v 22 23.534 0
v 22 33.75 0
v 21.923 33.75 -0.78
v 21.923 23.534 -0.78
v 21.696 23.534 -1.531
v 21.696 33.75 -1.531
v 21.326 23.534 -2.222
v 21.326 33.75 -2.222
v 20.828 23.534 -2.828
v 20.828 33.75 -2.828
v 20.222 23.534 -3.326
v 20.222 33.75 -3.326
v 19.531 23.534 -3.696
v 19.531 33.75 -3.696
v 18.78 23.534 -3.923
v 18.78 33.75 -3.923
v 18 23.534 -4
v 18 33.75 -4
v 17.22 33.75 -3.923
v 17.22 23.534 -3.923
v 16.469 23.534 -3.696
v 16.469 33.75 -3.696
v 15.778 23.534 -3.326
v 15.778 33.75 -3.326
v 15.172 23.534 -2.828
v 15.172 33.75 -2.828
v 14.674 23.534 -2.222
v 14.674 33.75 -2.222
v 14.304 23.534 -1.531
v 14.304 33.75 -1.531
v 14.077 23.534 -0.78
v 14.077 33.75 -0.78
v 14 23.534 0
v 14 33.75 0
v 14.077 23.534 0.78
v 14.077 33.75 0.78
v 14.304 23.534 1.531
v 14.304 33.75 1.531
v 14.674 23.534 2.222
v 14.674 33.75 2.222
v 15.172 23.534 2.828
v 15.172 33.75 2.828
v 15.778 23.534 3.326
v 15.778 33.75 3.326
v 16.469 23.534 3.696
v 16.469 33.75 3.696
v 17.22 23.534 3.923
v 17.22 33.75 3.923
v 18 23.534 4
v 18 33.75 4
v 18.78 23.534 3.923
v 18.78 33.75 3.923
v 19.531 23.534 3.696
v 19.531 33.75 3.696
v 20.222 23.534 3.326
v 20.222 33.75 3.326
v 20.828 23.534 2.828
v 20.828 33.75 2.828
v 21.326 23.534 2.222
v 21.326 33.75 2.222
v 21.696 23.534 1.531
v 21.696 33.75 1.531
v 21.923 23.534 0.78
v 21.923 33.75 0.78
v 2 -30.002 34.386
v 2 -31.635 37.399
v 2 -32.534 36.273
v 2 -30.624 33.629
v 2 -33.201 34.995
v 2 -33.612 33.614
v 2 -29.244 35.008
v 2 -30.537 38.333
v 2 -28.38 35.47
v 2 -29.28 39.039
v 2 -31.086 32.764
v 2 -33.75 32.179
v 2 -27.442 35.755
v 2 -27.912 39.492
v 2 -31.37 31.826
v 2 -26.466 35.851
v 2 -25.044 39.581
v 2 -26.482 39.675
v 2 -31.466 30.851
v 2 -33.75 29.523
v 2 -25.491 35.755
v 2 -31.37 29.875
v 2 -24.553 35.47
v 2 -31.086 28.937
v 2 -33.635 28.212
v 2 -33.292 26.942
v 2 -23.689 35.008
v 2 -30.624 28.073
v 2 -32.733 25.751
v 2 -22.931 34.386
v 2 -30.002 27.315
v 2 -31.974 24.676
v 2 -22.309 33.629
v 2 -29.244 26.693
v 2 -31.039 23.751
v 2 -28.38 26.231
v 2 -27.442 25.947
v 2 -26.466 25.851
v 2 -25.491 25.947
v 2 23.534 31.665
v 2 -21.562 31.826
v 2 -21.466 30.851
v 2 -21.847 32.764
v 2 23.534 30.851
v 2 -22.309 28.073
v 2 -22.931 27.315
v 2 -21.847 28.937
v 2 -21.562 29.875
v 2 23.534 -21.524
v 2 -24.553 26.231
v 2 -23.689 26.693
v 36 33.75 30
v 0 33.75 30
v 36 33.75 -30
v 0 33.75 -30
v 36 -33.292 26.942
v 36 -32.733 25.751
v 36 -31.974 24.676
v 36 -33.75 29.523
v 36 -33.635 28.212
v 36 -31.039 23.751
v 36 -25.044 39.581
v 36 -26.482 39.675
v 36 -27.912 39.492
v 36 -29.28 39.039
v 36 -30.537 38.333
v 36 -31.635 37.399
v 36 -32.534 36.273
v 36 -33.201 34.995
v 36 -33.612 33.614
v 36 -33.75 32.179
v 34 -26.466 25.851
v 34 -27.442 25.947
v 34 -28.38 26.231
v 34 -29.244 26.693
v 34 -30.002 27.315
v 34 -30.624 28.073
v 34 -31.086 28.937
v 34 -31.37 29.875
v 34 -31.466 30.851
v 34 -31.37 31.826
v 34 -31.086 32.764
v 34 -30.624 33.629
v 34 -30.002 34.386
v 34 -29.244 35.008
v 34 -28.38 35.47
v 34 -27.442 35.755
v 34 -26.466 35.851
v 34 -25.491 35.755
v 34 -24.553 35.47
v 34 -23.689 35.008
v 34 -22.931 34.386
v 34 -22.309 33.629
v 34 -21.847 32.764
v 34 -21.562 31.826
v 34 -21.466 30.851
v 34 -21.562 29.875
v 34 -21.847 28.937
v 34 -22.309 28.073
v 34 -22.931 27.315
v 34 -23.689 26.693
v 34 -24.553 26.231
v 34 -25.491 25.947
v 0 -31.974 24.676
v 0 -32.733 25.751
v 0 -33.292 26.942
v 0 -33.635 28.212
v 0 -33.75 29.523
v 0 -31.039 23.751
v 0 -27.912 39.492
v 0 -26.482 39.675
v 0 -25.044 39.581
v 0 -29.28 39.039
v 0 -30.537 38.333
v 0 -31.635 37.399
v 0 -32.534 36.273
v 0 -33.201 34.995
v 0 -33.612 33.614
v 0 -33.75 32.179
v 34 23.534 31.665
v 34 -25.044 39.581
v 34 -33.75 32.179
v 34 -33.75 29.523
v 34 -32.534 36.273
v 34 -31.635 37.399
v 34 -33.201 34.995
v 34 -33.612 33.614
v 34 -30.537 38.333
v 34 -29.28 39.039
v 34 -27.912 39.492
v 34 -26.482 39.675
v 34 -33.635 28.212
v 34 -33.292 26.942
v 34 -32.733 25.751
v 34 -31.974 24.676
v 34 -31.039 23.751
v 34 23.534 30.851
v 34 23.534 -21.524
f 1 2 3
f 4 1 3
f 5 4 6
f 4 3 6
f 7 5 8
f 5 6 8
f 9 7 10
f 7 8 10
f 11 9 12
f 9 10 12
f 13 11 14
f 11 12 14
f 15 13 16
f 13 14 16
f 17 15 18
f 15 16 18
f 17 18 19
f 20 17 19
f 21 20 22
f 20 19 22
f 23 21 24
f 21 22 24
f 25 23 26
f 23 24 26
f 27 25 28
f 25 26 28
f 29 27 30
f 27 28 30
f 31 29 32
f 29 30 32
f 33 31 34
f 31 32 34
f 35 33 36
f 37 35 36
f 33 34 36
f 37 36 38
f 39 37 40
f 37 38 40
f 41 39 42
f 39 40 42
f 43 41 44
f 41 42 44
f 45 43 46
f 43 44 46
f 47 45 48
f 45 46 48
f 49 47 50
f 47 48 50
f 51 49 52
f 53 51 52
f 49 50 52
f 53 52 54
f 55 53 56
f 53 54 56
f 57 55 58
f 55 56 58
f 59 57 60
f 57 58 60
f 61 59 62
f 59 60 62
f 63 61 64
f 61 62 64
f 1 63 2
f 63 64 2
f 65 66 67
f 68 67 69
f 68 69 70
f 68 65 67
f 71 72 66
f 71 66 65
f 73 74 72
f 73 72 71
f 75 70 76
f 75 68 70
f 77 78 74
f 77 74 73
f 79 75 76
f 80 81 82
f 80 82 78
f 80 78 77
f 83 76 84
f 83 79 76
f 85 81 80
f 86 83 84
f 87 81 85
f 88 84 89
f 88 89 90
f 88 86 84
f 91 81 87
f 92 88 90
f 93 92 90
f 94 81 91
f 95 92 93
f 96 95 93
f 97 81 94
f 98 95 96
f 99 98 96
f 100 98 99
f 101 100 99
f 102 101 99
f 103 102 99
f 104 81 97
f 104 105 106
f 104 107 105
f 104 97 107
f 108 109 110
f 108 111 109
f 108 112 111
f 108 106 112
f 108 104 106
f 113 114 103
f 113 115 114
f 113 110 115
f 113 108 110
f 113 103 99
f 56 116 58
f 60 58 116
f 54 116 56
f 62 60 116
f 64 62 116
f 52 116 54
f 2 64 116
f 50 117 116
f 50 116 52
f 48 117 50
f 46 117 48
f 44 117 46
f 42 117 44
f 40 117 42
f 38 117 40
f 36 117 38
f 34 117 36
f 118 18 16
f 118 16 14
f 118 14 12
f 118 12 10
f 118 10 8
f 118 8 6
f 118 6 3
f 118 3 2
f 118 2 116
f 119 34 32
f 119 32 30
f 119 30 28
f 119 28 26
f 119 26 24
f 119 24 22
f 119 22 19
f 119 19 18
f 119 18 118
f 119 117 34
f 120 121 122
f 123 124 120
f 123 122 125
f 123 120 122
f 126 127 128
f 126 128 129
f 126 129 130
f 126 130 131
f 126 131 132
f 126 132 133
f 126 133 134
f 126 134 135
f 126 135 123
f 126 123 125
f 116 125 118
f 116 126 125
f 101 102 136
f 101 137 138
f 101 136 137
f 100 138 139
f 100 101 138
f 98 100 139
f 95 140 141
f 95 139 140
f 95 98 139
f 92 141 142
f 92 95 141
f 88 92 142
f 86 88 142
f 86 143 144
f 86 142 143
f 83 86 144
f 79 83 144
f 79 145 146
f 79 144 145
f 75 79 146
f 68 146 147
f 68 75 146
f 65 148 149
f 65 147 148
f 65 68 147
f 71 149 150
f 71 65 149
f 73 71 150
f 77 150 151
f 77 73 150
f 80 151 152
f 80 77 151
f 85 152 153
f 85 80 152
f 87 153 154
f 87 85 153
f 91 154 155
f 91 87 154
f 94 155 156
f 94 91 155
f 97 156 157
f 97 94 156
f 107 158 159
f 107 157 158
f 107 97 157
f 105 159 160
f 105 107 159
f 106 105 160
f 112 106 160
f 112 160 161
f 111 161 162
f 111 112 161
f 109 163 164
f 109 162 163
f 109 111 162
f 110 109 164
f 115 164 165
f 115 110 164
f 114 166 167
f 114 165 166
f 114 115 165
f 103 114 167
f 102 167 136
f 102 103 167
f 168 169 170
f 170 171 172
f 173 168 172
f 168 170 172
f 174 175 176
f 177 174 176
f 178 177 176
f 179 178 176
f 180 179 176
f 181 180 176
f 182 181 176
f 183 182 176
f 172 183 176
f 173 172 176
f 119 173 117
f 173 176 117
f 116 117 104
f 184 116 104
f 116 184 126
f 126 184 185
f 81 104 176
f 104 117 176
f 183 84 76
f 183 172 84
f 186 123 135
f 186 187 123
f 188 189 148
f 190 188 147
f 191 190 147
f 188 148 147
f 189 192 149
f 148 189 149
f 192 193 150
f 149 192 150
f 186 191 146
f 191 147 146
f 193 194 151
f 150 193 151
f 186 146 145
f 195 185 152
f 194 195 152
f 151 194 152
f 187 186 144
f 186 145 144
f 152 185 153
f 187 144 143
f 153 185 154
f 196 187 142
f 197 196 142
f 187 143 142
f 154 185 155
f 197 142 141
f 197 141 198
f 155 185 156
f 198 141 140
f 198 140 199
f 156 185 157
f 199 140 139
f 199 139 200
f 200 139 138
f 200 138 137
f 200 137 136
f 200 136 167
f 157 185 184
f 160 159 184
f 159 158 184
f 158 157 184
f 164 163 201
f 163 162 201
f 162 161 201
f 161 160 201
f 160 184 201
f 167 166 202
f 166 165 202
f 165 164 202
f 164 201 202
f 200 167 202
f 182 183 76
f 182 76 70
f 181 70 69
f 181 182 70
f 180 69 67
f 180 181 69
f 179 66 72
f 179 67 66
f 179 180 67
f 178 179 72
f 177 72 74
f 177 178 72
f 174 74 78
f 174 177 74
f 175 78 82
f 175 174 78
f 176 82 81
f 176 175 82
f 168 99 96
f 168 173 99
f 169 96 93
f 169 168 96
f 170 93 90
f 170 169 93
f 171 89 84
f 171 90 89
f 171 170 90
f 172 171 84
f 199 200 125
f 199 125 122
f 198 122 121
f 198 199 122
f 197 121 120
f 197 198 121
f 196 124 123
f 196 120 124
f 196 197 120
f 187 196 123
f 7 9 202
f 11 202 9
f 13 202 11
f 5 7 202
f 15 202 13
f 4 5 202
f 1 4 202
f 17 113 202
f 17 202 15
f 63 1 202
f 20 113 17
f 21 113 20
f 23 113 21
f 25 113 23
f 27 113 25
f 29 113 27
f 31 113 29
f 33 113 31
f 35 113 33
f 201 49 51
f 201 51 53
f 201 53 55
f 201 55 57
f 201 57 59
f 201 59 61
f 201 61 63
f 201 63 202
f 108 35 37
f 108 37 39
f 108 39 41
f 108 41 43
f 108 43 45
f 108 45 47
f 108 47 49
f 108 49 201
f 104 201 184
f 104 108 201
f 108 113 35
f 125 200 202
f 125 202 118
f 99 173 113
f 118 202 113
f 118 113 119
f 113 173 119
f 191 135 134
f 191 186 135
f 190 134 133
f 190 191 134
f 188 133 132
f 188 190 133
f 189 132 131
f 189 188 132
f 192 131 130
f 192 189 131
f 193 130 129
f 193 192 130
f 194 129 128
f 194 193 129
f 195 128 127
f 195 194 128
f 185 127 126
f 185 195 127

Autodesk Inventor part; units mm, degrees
ref_plane "YZ Plane" through (0, 0, 0) normal (1, 0, 0) x (0, 1, 0)
ref_plane "XZ Plane" through (0, 0, 0) normal (0, 1, 0) x (-1, 0, 0)
ref_plane "XY Plane" through (0, 0, 0) normal (0, 0, 1) x (1, 0, 0)
sketch "스케치1" plane through (0, 0, 0) normal (1, 0, 0) x (0, 1, 0)
  line L0 (-33.75, 41) -> (33.75, 41)
  line L1 (33.75, 41) -> (33.75, -41)
  line L2 (33.75, -41) -> (-33.75, -41)
  line L3 (-33.75, 29.5228) -> (-33.75, 32.1788)
  line L4 (-33.75, 41) -> (33.75, -41) construction
  line L5 (33.75, 41) -> (-33.75, -41) construction
  line L6 (33.75, 41) -> (33.75, 35)
  line L7 (33.75, 0) -> (33.75, 30)
  line L8 (33.75, 30) -> (-25.0437, 39.5812)
  line L9 (33.75, 0) -> (33.75, -30)
  line L10 (-31.0388, 23.7507) -> (33.75, -30)
  arc A0 (-33.75, 29.5228) -> (-31.0388, 23.7507) centre (-26.25, 29.5228) ccw
  arc A1 (-25.0437, 39.5812) -> (-33.75, 32.1788) centre (-26.25, 32.1788) ccw
  point P0 (0, 0)
  point P1 (-33.75, 26)
  dimension "d3" = 67.5
  dimension "d4" = 82
  dimension "d6" = 30
  dimension "d7" = 30
  dimension "d9" = 15
  dimension "d10" = 7.5
extrude "돌출1" add sketch "스케치1" along normal blind 36
ref_plane "작업 평면1" through (18, 0, 0) normal (1, 0, 0) x (0, 0, -1)
sketch "스케치2" plane through (18, 0, 0) normal (1, 0, 0) x (0, 0, -1)
  line L0 (-30, 33.75) -> (-39.5812, -25.0437) projected
  arc A0 (-39.5812, -25.0437) -> (-32.1788, -33.75) centre (-32.1788, -26.25) ccw projected
  line L1 (-32.1788, -33.75) -> (-29.5228, -33.75) projected
  arc A1 (-29.5228, -33.75) -> (-23.7507, -31.0388) centre (-29.5228, -26.25) ccw projected
  line L2 (-23.7507, -31.0388) -> (30, 33.75) projected
  line L3 (30, 33.75) -> (-30, 33.75) projected
  line L4 (30, 33.75) -> (-30, 33.75) projected
  line L5 (-30, 33.75) -> (-39.5812, -25.0437) projected
  circle A2 centre (-30.8508, -26.4664) radius 5
  line L6 (-30.8508, -26.4664) -> (-30.8508, 23.5336)
  line L7 (-30.8508, 23.5336) -> (21.5242, 23.5336)
  line L8 (-23.7507, -31.0388) -> (30, 33.75) projected
  line L9 (-30.8508, 23.5336) -> (-31.6649, 23.5336)
  point P0 (0, 0)
  dimension "d14" = 10
  dimension "d15" = 50
extrude "돌출2" cut sketch "스케치2" along normal blind 16 and the other way blind 16 contours L9 L7 L2 A1 L1 A0 L0
sketch "스케치3" plane through (0, 33.75, 30) normal (0, 1, 0) x (1, 0, 0)
  line L0 (0, 60) -> (0, 0) projected
  line L1 (0, 0) -> (36, 0) projected
  line L2 (36, 60) -> (36, 0) projected
  line L3 (0, 60) -> (36, 60) projected
  line L4 (18, 0) -> (18, 60)
  line L5 (0, 30) -> (36, 30)
  line L6 (36, 6.2493) -> (36, 60) projected
  circle A0 centre (18, 30) radius 4
  dimension "d20" = 8
extrude "돌출3" cut sketch "스케치3" against normal blind 16 contours A0 L4 L5 | L5 L4 A0 | A0 L5 L4 | L5 A0 L4
properties part number "Part_MetalLeg" material "스테인레스 스틸"
